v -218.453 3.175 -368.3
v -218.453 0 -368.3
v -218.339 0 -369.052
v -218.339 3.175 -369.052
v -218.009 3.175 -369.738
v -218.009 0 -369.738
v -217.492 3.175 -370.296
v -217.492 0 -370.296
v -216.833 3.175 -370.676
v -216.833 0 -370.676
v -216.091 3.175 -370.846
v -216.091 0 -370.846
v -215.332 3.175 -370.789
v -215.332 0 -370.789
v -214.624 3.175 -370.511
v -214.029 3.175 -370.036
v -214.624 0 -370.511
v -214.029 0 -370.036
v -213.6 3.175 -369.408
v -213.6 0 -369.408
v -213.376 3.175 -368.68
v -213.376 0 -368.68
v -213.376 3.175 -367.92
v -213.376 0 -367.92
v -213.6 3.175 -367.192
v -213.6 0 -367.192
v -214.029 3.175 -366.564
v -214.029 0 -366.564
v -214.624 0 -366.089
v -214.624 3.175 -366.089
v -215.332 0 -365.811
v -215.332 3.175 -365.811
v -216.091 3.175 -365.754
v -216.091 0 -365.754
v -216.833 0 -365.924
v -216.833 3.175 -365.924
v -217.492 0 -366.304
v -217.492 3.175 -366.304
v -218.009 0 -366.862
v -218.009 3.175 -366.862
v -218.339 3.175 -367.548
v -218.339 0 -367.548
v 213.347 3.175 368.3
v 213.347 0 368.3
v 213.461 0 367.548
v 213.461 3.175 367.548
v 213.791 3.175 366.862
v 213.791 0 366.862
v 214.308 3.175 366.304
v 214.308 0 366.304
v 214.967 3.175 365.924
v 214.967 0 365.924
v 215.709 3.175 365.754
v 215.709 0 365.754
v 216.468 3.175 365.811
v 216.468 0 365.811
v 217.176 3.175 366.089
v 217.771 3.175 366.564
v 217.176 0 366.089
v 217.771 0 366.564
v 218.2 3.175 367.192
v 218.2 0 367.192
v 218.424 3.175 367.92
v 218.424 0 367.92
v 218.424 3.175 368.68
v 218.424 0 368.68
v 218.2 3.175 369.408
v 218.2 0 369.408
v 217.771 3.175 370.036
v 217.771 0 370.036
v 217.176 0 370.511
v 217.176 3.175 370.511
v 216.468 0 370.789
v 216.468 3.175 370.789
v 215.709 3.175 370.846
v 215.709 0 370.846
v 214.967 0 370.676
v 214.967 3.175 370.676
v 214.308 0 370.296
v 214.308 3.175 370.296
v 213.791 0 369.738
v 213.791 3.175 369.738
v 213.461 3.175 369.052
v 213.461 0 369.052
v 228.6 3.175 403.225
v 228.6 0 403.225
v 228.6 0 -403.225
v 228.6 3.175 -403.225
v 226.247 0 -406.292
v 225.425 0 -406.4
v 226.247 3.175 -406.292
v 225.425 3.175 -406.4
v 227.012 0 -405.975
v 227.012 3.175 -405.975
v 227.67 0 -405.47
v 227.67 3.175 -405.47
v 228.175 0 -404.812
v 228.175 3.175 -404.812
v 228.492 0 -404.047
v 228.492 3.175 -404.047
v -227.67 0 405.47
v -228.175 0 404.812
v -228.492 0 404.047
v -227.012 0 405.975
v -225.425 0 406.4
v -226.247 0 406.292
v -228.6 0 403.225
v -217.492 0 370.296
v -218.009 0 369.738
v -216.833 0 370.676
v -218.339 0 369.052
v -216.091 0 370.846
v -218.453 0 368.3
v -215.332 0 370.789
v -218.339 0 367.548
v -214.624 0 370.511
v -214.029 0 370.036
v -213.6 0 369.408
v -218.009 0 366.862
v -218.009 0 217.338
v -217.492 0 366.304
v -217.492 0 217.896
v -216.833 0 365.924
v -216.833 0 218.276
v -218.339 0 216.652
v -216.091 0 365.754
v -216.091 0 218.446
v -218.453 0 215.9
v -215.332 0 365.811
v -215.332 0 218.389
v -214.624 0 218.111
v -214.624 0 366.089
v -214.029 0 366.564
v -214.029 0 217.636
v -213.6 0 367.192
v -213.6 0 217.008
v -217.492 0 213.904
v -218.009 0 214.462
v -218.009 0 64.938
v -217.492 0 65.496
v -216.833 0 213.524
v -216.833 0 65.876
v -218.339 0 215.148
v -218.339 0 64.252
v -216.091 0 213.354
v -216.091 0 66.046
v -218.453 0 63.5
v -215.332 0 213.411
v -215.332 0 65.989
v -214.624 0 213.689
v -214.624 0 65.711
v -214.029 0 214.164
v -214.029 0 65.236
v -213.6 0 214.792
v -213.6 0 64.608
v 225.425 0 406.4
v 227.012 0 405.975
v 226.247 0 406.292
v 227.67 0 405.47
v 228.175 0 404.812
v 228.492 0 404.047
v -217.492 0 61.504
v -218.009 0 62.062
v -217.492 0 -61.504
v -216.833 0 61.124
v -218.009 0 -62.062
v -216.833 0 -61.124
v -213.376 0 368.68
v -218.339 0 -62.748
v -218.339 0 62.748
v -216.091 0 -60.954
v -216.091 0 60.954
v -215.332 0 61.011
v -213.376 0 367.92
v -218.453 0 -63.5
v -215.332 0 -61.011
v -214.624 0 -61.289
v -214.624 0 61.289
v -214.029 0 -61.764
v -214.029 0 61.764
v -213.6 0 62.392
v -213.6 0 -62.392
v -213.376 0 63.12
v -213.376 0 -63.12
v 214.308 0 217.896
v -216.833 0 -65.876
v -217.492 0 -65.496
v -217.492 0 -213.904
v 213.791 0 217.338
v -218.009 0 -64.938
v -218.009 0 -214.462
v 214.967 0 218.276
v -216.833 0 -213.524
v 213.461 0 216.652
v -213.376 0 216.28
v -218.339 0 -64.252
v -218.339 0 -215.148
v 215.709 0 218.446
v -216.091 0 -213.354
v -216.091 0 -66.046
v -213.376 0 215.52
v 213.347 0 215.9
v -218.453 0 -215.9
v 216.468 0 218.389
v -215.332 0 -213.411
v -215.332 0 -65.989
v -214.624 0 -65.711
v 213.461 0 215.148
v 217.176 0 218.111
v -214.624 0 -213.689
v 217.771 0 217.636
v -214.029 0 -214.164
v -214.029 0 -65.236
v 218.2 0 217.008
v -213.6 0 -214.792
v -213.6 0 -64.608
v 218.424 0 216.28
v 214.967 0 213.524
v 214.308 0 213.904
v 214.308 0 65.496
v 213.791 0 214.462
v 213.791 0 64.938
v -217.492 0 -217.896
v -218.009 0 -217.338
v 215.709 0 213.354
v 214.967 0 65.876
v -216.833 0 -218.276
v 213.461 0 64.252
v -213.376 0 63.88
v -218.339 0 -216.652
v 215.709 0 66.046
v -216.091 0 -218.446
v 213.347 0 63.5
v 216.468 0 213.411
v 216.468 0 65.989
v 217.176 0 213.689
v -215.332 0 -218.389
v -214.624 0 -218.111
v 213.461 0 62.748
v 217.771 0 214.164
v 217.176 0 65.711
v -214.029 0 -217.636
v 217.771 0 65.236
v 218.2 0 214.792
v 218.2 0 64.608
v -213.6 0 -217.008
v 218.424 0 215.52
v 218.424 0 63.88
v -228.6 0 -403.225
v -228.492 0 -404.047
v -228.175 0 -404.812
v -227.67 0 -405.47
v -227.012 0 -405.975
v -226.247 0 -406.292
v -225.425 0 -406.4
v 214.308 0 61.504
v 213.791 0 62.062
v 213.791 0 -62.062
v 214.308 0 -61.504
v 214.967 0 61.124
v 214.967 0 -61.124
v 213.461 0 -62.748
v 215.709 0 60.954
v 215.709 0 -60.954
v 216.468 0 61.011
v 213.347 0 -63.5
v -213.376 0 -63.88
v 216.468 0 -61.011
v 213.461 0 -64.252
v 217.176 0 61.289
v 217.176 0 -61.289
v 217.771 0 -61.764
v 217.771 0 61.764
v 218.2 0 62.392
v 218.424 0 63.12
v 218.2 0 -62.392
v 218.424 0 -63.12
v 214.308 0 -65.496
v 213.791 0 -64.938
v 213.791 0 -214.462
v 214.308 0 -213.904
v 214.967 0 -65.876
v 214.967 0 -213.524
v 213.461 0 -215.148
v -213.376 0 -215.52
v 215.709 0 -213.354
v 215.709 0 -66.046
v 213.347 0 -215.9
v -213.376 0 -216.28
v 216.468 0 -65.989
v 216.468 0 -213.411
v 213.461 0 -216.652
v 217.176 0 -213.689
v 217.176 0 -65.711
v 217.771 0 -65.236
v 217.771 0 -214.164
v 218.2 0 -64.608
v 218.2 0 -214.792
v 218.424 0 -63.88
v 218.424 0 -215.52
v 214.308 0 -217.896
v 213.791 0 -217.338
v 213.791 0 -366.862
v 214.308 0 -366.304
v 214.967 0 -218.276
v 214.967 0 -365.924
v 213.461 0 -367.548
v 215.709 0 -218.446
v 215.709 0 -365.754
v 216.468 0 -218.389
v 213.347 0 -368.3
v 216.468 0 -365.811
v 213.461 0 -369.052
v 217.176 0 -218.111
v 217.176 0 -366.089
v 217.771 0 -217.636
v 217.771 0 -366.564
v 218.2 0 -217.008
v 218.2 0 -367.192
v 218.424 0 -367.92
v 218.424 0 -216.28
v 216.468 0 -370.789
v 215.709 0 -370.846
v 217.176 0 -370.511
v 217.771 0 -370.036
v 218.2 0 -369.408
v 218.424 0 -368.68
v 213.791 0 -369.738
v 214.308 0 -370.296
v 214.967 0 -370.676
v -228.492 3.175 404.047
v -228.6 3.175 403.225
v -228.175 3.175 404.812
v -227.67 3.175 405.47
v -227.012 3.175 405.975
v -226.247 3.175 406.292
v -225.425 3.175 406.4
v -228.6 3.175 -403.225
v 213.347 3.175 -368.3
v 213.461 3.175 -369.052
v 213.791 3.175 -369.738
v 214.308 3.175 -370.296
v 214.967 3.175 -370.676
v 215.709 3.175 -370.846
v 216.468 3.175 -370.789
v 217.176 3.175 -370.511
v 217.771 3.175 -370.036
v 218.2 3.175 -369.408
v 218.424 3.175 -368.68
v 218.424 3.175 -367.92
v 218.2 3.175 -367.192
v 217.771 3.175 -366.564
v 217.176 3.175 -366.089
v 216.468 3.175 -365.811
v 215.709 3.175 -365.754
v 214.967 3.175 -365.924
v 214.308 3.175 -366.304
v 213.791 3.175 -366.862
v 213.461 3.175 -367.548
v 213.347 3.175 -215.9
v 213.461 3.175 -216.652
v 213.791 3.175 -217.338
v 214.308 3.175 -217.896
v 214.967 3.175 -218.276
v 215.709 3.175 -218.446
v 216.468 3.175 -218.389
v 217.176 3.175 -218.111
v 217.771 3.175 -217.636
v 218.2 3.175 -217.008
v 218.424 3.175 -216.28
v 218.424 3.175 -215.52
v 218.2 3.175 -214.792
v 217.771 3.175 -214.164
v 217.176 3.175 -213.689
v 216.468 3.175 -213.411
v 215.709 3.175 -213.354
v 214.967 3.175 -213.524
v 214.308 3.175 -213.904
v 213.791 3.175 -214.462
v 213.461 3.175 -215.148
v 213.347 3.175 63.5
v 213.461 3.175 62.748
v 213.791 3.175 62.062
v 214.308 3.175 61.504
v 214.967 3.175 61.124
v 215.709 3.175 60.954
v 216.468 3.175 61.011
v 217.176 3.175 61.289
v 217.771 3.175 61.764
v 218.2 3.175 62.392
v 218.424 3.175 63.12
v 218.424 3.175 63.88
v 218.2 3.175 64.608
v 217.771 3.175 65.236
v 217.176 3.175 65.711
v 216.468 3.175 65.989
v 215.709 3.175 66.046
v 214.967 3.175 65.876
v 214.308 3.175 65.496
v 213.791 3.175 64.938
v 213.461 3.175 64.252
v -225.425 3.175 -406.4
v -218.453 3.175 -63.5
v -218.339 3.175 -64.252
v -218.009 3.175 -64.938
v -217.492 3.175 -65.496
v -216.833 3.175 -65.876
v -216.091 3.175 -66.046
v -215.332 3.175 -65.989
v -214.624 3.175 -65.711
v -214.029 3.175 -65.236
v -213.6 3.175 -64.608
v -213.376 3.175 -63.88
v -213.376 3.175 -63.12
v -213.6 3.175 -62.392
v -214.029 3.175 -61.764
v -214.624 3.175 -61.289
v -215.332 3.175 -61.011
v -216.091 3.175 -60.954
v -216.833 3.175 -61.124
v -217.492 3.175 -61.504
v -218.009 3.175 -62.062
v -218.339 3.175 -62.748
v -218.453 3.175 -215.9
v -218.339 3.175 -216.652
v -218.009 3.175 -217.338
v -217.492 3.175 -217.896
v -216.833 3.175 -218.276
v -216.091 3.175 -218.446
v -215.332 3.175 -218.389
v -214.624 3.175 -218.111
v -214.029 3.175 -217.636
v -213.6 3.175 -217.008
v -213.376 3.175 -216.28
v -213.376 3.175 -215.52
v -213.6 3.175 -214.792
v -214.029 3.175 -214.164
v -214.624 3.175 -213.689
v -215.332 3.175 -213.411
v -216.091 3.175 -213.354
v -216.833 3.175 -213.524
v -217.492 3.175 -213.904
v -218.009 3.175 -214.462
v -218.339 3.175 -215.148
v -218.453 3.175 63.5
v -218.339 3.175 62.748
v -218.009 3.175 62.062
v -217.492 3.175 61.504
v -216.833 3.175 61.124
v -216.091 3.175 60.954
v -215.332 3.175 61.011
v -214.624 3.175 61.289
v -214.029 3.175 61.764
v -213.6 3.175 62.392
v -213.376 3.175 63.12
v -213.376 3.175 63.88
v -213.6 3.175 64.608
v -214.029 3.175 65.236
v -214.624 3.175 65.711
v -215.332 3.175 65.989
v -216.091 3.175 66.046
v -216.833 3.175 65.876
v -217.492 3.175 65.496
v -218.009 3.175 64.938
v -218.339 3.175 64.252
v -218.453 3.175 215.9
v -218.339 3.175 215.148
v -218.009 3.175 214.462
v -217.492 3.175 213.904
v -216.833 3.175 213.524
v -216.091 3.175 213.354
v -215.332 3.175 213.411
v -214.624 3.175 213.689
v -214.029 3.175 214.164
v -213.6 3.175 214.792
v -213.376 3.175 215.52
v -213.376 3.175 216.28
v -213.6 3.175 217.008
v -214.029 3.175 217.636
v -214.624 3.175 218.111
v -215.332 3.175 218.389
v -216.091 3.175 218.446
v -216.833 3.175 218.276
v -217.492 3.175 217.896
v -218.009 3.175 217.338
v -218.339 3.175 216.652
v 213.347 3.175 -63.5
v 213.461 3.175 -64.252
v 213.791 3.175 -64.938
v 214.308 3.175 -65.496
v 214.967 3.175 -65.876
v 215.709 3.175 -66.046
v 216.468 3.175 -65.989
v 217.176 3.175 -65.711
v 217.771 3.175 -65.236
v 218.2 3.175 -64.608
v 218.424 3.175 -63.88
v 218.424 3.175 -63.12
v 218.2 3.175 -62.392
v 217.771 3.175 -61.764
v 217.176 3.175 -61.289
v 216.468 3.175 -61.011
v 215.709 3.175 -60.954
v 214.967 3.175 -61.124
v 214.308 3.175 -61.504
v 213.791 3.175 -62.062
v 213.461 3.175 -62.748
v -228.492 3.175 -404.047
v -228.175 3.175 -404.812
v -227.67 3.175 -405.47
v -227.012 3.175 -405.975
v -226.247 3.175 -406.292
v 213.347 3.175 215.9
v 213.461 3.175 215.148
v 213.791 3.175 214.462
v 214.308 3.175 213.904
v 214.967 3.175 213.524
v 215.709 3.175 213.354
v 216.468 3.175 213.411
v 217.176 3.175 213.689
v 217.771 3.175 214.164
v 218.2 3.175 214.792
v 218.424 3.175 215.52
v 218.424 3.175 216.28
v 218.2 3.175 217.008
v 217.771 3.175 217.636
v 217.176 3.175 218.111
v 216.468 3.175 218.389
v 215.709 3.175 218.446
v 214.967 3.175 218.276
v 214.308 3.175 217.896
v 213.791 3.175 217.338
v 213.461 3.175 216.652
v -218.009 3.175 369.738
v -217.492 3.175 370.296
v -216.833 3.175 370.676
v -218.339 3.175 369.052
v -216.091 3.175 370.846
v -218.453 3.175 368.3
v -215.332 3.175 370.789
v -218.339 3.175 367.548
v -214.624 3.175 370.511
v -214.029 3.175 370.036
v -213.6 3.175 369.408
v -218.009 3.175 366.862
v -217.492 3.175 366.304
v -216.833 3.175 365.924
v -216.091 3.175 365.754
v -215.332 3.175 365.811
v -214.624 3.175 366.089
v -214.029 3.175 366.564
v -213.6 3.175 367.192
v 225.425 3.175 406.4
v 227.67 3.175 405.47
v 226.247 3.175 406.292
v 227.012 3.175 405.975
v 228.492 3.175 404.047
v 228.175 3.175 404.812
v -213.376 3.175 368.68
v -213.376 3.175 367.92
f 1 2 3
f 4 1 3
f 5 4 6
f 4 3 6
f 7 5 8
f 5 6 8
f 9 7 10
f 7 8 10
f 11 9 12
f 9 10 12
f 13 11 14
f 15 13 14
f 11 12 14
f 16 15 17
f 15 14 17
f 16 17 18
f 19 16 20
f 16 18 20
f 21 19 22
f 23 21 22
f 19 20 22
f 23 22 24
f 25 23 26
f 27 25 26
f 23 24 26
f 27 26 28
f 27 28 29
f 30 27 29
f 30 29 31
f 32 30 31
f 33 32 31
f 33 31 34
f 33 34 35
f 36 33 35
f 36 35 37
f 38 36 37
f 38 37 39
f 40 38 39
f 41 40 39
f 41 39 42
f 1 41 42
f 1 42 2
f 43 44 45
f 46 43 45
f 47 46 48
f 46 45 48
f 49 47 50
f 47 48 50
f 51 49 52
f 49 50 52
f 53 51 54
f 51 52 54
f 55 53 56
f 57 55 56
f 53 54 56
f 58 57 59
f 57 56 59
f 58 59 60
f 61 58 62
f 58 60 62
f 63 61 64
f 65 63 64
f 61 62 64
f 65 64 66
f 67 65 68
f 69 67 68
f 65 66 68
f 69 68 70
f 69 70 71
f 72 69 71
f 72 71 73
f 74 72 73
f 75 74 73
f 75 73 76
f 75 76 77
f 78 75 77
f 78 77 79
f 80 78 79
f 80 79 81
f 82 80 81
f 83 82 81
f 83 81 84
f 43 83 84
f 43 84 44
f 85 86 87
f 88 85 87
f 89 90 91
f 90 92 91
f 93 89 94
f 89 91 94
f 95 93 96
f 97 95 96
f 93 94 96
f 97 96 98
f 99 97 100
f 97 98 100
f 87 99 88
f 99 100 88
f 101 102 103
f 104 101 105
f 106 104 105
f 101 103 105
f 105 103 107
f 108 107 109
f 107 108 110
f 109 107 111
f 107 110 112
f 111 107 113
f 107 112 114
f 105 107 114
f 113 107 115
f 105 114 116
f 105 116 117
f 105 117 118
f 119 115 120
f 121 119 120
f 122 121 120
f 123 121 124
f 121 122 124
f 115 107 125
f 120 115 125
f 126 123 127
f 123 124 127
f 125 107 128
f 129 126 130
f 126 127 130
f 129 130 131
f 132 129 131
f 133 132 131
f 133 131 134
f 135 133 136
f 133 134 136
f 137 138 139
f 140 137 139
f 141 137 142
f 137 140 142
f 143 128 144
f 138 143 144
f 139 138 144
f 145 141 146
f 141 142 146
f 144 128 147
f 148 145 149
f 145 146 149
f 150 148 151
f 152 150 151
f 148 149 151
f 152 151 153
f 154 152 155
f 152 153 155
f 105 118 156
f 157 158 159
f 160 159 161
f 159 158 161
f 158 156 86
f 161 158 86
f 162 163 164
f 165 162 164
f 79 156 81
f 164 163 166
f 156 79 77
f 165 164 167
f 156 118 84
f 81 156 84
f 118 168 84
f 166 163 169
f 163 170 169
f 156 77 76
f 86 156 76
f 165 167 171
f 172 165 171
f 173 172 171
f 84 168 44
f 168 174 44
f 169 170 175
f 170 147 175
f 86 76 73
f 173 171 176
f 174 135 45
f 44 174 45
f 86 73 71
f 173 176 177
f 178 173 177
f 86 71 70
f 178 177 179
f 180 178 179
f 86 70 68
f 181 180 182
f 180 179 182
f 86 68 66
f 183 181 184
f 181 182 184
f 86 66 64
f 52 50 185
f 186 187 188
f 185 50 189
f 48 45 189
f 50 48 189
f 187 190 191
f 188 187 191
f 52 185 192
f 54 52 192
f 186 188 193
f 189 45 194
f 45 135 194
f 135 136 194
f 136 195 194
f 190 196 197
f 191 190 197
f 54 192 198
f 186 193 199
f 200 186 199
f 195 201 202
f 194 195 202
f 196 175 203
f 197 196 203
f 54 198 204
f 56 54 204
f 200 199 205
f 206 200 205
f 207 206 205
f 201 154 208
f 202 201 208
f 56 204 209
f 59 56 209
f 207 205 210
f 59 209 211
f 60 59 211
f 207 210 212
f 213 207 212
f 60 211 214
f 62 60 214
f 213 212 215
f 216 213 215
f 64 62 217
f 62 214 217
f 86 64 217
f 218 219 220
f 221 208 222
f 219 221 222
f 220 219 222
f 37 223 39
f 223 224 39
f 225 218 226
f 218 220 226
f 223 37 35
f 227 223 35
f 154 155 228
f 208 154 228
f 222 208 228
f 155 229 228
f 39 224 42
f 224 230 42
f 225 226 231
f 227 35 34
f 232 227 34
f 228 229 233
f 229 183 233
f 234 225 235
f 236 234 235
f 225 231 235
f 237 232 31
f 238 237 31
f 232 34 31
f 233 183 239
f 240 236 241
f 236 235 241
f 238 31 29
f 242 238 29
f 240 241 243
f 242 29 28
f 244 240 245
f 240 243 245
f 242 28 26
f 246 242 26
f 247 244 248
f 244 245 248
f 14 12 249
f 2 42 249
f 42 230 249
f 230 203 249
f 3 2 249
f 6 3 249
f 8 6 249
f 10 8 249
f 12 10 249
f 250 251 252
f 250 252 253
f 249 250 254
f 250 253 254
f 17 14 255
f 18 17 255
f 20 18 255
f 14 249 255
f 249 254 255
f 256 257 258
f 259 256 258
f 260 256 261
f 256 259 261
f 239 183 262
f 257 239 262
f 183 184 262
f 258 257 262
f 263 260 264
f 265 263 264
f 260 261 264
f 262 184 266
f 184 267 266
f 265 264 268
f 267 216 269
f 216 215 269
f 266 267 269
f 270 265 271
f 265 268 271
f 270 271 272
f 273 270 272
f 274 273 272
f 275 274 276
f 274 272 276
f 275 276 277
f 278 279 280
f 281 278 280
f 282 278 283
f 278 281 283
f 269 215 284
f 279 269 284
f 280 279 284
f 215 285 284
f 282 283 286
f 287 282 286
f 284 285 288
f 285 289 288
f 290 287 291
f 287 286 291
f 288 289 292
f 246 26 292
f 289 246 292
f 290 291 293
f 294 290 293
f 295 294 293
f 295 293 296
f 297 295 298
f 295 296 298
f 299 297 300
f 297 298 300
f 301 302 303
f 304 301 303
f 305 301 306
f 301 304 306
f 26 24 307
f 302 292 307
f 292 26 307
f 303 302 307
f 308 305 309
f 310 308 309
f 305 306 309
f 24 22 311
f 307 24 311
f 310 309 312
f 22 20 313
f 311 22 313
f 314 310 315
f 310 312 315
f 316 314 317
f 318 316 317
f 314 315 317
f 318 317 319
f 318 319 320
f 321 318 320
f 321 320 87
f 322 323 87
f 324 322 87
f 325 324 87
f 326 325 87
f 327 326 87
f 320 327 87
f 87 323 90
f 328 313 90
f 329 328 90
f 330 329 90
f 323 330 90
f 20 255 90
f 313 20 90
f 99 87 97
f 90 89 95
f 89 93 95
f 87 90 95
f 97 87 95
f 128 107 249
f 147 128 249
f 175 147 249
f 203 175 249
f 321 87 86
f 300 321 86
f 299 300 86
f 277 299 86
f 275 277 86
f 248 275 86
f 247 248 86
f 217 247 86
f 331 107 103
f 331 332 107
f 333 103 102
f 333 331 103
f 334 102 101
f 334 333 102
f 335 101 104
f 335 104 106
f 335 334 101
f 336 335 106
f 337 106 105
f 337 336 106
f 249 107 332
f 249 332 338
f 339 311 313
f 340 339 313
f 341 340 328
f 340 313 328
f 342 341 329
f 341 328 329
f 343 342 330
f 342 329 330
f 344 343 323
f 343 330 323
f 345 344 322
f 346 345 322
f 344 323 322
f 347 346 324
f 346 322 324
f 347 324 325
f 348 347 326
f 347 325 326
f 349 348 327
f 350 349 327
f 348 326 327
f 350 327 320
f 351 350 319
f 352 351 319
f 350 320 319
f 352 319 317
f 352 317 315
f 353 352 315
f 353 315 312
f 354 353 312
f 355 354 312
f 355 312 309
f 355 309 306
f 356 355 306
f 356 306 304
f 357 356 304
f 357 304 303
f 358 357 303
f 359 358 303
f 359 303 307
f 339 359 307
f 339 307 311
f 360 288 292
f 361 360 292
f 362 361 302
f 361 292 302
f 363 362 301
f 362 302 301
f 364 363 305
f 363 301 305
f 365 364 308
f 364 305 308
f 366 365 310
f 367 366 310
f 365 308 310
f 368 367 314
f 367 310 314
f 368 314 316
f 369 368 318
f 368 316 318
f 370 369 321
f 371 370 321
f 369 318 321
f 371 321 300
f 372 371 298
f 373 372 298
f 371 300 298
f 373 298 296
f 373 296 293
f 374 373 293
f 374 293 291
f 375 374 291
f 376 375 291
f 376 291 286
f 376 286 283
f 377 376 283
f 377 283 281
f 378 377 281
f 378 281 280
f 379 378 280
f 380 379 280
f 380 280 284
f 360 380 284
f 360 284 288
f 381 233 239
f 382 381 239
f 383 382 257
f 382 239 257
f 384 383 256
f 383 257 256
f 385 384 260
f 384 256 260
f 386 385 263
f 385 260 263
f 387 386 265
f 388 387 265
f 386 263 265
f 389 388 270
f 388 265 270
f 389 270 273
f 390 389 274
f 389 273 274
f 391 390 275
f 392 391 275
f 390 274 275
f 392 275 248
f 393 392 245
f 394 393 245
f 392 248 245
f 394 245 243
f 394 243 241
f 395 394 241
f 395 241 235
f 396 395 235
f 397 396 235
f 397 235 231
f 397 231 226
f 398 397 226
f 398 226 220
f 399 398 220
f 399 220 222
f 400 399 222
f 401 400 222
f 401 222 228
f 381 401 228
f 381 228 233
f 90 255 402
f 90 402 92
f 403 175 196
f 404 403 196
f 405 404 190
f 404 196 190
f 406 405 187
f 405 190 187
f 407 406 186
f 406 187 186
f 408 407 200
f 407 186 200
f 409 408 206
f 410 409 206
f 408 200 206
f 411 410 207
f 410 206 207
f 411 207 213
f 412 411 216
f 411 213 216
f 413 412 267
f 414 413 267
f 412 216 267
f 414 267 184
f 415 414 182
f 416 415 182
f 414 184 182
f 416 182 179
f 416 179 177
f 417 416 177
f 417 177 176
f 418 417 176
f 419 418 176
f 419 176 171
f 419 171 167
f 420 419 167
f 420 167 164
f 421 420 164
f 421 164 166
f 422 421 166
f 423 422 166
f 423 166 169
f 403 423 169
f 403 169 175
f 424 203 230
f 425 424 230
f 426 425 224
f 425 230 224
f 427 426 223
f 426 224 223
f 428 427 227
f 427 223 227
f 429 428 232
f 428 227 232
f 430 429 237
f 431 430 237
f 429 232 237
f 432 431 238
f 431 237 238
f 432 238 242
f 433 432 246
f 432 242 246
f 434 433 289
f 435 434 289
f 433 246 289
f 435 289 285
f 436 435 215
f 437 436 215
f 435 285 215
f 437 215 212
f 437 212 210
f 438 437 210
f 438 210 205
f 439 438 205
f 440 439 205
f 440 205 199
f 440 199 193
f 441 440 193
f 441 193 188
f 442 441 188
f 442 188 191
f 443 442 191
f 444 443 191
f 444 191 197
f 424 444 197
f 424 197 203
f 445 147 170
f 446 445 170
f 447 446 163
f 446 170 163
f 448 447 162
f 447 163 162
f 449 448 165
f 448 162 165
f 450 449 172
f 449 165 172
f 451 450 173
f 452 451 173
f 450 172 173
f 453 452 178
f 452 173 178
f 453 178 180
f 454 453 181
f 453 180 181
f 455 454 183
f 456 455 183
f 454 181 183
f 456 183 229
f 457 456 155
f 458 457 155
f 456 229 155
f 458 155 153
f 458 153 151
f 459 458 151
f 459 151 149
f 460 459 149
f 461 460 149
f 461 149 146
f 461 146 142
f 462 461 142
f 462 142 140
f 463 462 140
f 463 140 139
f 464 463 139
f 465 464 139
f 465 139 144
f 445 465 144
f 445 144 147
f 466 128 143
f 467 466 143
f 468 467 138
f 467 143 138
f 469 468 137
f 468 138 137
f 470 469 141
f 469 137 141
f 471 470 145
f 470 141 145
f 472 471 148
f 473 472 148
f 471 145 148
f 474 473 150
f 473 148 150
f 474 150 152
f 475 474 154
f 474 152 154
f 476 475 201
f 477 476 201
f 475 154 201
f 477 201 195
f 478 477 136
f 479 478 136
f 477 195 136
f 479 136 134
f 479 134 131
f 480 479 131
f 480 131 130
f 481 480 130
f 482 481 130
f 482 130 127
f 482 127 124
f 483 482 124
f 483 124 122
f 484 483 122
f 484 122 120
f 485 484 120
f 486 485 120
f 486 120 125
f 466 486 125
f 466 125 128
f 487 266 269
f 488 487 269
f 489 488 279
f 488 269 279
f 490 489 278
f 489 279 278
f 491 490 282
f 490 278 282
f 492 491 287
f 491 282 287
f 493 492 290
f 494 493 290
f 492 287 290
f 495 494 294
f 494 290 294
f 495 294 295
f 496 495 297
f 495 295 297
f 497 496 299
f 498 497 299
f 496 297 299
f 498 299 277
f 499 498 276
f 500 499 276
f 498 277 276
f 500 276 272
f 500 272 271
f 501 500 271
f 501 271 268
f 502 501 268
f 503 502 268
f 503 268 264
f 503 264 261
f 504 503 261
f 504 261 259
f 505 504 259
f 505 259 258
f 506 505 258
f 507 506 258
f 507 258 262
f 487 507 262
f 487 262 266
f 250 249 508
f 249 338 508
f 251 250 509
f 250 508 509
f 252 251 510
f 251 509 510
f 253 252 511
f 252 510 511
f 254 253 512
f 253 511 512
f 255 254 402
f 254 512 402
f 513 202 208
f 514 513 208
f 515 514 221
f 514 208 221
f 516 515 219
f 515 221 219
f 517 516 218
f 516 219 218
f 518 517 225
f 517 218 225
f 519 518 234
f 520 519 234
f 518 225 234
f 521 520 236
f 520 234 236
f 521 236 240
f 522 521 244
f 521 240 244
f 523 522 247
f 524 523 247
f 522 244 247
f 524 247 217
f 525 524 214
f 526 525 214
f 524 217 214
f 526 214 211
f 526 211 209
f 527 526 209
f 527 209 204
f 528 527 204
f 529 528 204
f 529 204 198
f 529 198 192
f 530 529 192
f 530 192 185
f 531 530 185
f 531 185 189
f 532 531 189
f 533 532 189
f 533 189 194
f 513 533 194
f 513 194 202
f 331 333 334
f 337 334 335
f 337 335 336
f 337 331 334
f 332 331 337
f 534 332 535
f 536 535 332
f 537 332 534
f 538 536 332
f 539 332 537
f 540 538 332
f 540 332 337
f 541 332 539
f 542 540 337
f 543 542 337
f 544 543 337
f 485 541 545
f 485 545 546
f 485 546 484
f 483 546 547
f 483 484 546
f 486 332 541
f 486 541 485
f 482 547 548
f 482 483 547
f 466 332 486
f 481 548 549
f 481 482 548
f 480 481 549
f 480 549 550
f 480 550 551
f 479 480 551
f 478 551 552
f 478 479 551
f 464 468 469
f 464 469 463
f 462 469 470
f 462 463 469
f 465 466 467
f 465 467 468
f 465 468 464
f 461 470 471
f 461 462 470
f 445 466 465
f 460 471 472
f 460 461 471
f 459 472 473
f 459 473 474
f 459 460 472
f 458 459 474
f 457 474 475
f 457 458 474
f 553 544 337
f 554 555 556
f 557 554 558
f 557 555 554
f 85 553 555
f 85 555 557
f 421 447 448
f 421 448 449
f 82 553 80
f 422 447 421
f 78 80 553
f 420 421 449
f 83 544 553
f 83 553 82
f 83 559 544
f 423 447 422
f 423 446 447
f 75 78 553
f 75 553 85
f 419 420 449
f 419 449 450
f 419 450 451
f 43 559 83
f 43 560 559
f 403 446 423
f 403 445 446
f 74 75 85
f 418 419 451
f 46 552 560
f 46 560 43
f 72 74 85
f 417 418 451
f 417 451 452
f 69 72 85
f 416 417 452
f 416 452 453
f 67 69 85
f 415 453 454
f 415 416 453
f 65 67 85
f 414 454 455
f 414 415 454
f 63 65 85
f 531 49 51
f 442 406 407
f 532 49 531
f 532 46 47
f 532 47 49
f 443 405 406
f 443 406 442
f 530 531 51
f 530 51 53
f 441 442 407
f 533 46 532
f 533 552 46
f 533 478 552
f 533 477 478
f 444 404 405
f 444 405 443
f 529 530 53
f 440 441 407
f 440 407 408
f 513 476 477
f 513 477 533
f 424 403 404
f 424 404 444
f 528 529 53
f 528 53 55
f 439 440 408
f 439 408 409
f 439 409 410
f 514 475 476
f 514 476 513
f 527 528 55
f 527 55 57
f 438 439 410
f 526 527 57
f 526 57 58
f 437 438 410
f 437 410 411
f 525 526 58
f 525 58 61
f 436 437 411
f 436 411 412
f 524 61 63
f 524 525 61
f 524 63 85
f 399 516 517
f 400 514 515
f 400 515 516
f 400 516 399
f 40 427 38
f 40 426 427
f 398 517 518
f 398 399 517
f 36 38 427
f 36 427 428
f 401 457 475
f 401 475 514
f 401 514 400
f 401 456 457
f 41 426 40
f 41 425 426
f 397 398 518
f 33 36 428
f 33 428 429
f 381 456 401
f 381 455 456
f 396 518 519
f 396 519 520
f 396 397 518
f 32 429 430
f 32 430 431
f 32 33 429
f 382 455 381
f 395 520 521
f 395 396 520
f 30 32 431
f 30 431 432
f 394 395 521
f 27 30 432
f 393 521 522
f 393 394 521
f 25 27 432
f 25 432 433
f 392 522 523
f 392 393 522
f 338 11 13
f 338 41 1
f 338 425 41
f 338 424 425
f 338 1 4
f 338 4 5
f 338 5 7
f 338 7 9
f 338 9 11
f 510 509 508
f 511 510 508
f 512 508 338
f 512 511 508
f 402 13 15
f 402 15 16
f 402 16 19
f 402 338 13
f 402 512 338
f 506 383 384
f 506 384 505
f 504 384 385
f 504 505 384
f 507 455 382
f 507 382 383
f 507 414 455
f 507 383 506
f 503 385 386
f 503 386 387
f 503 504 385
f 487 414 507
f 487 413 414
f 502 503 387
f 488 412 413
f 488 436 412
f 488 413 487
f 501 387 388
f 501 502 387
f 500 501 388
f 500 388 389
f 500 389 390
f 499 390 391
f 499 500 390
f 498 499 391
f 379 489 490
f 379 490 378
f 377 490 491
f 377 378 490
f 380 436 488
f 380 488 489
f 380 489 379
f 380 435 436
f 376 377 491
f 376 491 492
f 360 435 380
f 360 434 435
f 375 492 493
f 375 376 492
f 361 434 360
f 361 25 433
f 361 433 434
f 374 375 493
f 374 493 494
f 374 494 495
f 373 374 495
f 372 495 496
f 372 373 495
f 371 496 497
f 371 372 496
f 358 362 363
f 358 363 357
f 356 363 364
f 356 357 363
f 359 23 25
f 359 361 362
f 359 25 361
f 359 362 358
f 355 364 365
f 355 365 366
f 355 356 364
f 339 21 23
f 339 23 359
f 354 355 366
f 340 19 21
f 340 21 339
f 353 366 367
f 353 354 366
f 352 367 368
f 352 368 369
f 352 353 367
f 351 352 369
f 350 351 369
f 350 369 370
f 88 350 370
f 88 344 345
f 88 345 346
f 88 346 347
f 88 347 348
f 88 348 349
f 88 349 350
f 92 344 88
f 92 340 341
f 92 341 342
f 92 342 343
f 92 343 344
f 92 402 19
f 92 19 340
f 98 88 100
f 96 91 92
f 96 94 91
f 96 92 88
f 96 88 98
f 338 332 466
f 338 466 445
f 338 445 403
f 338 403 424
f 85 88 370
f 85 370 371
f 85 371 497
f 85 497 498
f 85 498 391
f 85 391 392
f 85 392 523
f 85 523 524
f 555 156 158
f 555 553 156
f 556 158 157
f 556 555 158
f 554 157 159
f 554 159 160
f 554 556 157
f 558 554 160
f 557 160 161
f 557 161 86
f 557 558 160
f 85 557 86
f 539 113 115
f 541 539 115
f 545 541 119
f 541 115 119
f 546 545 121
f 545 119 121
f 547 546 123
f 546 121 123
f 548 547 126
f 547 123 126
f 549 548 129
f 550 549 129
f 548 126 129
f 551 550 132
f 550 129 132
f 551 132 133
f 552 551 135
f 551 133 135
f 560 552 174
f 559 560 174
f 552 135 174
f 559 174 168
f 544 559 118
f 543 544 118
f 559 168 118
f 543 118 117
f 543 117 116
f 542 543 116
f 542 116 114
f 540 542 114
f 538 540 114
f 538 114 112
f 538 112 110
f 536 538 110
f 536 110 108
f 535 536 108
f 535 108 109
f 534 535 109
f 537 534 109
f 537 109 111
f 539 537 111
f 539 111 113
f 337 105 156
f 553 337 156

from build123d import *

# Parameters (mm, degrees)
SKETCH1_W                  = 457.2
SKETCH1_H                  = 812.8
BOSS_EXTRUDE1_DEPTH        = 3.175
F_7_0_201_DIAMETER_HOLE1_D = 5.1054
FILLET1_R                  = 3.175


with BuildPart() as part:
    # Sketch1 → Boss-Extrude1 (new body)
    with BuildSketch(Plane(origin=(0, 0, 0), x_dir=(1, 0, 0), z_dir=(0, 1, 0))):
        Rectangle(SKETCH1_W, SKETCH1_H)
    extrude(amount=BOSS_EXTRUDE1_DEPTH)

    # #7 (0.201) Diameter Hole1 (through all)
    with Locations(Plane(origin=(0, 3.175, 0), x_dir=(1, 0, 0), z_dir=(0, 1, 0))):
        with Locations((-215.9, 368.3), (215.9, 368.3), (215.9, 215.9), (215.9, 63.5), (215.9, -63.5), (215.9, -215.9), (215.9, -368.3), (-215.9, 215.9), (-215.9, 63.5), (-215.9, -63.5), (-215.9, -215.9), (-215.9, -368.3)):
            Hole(F_7_0_201_DIAMETER_HOLE1_D / 2)

    # Fillet1
    fillet1_edges = [part.edges().sort_by_distance(p)[0] for p in [
        (228.6, 1.5875, 406.4),
        (-228.6, 1.5875, 406.4),
        (-228.6, 1.5875, -406.4),
        (228.6, 1.5875, -406.4),
    ]]
    fillet(fillet1_edges, radius=FILLET1_R)


solid = part.part
